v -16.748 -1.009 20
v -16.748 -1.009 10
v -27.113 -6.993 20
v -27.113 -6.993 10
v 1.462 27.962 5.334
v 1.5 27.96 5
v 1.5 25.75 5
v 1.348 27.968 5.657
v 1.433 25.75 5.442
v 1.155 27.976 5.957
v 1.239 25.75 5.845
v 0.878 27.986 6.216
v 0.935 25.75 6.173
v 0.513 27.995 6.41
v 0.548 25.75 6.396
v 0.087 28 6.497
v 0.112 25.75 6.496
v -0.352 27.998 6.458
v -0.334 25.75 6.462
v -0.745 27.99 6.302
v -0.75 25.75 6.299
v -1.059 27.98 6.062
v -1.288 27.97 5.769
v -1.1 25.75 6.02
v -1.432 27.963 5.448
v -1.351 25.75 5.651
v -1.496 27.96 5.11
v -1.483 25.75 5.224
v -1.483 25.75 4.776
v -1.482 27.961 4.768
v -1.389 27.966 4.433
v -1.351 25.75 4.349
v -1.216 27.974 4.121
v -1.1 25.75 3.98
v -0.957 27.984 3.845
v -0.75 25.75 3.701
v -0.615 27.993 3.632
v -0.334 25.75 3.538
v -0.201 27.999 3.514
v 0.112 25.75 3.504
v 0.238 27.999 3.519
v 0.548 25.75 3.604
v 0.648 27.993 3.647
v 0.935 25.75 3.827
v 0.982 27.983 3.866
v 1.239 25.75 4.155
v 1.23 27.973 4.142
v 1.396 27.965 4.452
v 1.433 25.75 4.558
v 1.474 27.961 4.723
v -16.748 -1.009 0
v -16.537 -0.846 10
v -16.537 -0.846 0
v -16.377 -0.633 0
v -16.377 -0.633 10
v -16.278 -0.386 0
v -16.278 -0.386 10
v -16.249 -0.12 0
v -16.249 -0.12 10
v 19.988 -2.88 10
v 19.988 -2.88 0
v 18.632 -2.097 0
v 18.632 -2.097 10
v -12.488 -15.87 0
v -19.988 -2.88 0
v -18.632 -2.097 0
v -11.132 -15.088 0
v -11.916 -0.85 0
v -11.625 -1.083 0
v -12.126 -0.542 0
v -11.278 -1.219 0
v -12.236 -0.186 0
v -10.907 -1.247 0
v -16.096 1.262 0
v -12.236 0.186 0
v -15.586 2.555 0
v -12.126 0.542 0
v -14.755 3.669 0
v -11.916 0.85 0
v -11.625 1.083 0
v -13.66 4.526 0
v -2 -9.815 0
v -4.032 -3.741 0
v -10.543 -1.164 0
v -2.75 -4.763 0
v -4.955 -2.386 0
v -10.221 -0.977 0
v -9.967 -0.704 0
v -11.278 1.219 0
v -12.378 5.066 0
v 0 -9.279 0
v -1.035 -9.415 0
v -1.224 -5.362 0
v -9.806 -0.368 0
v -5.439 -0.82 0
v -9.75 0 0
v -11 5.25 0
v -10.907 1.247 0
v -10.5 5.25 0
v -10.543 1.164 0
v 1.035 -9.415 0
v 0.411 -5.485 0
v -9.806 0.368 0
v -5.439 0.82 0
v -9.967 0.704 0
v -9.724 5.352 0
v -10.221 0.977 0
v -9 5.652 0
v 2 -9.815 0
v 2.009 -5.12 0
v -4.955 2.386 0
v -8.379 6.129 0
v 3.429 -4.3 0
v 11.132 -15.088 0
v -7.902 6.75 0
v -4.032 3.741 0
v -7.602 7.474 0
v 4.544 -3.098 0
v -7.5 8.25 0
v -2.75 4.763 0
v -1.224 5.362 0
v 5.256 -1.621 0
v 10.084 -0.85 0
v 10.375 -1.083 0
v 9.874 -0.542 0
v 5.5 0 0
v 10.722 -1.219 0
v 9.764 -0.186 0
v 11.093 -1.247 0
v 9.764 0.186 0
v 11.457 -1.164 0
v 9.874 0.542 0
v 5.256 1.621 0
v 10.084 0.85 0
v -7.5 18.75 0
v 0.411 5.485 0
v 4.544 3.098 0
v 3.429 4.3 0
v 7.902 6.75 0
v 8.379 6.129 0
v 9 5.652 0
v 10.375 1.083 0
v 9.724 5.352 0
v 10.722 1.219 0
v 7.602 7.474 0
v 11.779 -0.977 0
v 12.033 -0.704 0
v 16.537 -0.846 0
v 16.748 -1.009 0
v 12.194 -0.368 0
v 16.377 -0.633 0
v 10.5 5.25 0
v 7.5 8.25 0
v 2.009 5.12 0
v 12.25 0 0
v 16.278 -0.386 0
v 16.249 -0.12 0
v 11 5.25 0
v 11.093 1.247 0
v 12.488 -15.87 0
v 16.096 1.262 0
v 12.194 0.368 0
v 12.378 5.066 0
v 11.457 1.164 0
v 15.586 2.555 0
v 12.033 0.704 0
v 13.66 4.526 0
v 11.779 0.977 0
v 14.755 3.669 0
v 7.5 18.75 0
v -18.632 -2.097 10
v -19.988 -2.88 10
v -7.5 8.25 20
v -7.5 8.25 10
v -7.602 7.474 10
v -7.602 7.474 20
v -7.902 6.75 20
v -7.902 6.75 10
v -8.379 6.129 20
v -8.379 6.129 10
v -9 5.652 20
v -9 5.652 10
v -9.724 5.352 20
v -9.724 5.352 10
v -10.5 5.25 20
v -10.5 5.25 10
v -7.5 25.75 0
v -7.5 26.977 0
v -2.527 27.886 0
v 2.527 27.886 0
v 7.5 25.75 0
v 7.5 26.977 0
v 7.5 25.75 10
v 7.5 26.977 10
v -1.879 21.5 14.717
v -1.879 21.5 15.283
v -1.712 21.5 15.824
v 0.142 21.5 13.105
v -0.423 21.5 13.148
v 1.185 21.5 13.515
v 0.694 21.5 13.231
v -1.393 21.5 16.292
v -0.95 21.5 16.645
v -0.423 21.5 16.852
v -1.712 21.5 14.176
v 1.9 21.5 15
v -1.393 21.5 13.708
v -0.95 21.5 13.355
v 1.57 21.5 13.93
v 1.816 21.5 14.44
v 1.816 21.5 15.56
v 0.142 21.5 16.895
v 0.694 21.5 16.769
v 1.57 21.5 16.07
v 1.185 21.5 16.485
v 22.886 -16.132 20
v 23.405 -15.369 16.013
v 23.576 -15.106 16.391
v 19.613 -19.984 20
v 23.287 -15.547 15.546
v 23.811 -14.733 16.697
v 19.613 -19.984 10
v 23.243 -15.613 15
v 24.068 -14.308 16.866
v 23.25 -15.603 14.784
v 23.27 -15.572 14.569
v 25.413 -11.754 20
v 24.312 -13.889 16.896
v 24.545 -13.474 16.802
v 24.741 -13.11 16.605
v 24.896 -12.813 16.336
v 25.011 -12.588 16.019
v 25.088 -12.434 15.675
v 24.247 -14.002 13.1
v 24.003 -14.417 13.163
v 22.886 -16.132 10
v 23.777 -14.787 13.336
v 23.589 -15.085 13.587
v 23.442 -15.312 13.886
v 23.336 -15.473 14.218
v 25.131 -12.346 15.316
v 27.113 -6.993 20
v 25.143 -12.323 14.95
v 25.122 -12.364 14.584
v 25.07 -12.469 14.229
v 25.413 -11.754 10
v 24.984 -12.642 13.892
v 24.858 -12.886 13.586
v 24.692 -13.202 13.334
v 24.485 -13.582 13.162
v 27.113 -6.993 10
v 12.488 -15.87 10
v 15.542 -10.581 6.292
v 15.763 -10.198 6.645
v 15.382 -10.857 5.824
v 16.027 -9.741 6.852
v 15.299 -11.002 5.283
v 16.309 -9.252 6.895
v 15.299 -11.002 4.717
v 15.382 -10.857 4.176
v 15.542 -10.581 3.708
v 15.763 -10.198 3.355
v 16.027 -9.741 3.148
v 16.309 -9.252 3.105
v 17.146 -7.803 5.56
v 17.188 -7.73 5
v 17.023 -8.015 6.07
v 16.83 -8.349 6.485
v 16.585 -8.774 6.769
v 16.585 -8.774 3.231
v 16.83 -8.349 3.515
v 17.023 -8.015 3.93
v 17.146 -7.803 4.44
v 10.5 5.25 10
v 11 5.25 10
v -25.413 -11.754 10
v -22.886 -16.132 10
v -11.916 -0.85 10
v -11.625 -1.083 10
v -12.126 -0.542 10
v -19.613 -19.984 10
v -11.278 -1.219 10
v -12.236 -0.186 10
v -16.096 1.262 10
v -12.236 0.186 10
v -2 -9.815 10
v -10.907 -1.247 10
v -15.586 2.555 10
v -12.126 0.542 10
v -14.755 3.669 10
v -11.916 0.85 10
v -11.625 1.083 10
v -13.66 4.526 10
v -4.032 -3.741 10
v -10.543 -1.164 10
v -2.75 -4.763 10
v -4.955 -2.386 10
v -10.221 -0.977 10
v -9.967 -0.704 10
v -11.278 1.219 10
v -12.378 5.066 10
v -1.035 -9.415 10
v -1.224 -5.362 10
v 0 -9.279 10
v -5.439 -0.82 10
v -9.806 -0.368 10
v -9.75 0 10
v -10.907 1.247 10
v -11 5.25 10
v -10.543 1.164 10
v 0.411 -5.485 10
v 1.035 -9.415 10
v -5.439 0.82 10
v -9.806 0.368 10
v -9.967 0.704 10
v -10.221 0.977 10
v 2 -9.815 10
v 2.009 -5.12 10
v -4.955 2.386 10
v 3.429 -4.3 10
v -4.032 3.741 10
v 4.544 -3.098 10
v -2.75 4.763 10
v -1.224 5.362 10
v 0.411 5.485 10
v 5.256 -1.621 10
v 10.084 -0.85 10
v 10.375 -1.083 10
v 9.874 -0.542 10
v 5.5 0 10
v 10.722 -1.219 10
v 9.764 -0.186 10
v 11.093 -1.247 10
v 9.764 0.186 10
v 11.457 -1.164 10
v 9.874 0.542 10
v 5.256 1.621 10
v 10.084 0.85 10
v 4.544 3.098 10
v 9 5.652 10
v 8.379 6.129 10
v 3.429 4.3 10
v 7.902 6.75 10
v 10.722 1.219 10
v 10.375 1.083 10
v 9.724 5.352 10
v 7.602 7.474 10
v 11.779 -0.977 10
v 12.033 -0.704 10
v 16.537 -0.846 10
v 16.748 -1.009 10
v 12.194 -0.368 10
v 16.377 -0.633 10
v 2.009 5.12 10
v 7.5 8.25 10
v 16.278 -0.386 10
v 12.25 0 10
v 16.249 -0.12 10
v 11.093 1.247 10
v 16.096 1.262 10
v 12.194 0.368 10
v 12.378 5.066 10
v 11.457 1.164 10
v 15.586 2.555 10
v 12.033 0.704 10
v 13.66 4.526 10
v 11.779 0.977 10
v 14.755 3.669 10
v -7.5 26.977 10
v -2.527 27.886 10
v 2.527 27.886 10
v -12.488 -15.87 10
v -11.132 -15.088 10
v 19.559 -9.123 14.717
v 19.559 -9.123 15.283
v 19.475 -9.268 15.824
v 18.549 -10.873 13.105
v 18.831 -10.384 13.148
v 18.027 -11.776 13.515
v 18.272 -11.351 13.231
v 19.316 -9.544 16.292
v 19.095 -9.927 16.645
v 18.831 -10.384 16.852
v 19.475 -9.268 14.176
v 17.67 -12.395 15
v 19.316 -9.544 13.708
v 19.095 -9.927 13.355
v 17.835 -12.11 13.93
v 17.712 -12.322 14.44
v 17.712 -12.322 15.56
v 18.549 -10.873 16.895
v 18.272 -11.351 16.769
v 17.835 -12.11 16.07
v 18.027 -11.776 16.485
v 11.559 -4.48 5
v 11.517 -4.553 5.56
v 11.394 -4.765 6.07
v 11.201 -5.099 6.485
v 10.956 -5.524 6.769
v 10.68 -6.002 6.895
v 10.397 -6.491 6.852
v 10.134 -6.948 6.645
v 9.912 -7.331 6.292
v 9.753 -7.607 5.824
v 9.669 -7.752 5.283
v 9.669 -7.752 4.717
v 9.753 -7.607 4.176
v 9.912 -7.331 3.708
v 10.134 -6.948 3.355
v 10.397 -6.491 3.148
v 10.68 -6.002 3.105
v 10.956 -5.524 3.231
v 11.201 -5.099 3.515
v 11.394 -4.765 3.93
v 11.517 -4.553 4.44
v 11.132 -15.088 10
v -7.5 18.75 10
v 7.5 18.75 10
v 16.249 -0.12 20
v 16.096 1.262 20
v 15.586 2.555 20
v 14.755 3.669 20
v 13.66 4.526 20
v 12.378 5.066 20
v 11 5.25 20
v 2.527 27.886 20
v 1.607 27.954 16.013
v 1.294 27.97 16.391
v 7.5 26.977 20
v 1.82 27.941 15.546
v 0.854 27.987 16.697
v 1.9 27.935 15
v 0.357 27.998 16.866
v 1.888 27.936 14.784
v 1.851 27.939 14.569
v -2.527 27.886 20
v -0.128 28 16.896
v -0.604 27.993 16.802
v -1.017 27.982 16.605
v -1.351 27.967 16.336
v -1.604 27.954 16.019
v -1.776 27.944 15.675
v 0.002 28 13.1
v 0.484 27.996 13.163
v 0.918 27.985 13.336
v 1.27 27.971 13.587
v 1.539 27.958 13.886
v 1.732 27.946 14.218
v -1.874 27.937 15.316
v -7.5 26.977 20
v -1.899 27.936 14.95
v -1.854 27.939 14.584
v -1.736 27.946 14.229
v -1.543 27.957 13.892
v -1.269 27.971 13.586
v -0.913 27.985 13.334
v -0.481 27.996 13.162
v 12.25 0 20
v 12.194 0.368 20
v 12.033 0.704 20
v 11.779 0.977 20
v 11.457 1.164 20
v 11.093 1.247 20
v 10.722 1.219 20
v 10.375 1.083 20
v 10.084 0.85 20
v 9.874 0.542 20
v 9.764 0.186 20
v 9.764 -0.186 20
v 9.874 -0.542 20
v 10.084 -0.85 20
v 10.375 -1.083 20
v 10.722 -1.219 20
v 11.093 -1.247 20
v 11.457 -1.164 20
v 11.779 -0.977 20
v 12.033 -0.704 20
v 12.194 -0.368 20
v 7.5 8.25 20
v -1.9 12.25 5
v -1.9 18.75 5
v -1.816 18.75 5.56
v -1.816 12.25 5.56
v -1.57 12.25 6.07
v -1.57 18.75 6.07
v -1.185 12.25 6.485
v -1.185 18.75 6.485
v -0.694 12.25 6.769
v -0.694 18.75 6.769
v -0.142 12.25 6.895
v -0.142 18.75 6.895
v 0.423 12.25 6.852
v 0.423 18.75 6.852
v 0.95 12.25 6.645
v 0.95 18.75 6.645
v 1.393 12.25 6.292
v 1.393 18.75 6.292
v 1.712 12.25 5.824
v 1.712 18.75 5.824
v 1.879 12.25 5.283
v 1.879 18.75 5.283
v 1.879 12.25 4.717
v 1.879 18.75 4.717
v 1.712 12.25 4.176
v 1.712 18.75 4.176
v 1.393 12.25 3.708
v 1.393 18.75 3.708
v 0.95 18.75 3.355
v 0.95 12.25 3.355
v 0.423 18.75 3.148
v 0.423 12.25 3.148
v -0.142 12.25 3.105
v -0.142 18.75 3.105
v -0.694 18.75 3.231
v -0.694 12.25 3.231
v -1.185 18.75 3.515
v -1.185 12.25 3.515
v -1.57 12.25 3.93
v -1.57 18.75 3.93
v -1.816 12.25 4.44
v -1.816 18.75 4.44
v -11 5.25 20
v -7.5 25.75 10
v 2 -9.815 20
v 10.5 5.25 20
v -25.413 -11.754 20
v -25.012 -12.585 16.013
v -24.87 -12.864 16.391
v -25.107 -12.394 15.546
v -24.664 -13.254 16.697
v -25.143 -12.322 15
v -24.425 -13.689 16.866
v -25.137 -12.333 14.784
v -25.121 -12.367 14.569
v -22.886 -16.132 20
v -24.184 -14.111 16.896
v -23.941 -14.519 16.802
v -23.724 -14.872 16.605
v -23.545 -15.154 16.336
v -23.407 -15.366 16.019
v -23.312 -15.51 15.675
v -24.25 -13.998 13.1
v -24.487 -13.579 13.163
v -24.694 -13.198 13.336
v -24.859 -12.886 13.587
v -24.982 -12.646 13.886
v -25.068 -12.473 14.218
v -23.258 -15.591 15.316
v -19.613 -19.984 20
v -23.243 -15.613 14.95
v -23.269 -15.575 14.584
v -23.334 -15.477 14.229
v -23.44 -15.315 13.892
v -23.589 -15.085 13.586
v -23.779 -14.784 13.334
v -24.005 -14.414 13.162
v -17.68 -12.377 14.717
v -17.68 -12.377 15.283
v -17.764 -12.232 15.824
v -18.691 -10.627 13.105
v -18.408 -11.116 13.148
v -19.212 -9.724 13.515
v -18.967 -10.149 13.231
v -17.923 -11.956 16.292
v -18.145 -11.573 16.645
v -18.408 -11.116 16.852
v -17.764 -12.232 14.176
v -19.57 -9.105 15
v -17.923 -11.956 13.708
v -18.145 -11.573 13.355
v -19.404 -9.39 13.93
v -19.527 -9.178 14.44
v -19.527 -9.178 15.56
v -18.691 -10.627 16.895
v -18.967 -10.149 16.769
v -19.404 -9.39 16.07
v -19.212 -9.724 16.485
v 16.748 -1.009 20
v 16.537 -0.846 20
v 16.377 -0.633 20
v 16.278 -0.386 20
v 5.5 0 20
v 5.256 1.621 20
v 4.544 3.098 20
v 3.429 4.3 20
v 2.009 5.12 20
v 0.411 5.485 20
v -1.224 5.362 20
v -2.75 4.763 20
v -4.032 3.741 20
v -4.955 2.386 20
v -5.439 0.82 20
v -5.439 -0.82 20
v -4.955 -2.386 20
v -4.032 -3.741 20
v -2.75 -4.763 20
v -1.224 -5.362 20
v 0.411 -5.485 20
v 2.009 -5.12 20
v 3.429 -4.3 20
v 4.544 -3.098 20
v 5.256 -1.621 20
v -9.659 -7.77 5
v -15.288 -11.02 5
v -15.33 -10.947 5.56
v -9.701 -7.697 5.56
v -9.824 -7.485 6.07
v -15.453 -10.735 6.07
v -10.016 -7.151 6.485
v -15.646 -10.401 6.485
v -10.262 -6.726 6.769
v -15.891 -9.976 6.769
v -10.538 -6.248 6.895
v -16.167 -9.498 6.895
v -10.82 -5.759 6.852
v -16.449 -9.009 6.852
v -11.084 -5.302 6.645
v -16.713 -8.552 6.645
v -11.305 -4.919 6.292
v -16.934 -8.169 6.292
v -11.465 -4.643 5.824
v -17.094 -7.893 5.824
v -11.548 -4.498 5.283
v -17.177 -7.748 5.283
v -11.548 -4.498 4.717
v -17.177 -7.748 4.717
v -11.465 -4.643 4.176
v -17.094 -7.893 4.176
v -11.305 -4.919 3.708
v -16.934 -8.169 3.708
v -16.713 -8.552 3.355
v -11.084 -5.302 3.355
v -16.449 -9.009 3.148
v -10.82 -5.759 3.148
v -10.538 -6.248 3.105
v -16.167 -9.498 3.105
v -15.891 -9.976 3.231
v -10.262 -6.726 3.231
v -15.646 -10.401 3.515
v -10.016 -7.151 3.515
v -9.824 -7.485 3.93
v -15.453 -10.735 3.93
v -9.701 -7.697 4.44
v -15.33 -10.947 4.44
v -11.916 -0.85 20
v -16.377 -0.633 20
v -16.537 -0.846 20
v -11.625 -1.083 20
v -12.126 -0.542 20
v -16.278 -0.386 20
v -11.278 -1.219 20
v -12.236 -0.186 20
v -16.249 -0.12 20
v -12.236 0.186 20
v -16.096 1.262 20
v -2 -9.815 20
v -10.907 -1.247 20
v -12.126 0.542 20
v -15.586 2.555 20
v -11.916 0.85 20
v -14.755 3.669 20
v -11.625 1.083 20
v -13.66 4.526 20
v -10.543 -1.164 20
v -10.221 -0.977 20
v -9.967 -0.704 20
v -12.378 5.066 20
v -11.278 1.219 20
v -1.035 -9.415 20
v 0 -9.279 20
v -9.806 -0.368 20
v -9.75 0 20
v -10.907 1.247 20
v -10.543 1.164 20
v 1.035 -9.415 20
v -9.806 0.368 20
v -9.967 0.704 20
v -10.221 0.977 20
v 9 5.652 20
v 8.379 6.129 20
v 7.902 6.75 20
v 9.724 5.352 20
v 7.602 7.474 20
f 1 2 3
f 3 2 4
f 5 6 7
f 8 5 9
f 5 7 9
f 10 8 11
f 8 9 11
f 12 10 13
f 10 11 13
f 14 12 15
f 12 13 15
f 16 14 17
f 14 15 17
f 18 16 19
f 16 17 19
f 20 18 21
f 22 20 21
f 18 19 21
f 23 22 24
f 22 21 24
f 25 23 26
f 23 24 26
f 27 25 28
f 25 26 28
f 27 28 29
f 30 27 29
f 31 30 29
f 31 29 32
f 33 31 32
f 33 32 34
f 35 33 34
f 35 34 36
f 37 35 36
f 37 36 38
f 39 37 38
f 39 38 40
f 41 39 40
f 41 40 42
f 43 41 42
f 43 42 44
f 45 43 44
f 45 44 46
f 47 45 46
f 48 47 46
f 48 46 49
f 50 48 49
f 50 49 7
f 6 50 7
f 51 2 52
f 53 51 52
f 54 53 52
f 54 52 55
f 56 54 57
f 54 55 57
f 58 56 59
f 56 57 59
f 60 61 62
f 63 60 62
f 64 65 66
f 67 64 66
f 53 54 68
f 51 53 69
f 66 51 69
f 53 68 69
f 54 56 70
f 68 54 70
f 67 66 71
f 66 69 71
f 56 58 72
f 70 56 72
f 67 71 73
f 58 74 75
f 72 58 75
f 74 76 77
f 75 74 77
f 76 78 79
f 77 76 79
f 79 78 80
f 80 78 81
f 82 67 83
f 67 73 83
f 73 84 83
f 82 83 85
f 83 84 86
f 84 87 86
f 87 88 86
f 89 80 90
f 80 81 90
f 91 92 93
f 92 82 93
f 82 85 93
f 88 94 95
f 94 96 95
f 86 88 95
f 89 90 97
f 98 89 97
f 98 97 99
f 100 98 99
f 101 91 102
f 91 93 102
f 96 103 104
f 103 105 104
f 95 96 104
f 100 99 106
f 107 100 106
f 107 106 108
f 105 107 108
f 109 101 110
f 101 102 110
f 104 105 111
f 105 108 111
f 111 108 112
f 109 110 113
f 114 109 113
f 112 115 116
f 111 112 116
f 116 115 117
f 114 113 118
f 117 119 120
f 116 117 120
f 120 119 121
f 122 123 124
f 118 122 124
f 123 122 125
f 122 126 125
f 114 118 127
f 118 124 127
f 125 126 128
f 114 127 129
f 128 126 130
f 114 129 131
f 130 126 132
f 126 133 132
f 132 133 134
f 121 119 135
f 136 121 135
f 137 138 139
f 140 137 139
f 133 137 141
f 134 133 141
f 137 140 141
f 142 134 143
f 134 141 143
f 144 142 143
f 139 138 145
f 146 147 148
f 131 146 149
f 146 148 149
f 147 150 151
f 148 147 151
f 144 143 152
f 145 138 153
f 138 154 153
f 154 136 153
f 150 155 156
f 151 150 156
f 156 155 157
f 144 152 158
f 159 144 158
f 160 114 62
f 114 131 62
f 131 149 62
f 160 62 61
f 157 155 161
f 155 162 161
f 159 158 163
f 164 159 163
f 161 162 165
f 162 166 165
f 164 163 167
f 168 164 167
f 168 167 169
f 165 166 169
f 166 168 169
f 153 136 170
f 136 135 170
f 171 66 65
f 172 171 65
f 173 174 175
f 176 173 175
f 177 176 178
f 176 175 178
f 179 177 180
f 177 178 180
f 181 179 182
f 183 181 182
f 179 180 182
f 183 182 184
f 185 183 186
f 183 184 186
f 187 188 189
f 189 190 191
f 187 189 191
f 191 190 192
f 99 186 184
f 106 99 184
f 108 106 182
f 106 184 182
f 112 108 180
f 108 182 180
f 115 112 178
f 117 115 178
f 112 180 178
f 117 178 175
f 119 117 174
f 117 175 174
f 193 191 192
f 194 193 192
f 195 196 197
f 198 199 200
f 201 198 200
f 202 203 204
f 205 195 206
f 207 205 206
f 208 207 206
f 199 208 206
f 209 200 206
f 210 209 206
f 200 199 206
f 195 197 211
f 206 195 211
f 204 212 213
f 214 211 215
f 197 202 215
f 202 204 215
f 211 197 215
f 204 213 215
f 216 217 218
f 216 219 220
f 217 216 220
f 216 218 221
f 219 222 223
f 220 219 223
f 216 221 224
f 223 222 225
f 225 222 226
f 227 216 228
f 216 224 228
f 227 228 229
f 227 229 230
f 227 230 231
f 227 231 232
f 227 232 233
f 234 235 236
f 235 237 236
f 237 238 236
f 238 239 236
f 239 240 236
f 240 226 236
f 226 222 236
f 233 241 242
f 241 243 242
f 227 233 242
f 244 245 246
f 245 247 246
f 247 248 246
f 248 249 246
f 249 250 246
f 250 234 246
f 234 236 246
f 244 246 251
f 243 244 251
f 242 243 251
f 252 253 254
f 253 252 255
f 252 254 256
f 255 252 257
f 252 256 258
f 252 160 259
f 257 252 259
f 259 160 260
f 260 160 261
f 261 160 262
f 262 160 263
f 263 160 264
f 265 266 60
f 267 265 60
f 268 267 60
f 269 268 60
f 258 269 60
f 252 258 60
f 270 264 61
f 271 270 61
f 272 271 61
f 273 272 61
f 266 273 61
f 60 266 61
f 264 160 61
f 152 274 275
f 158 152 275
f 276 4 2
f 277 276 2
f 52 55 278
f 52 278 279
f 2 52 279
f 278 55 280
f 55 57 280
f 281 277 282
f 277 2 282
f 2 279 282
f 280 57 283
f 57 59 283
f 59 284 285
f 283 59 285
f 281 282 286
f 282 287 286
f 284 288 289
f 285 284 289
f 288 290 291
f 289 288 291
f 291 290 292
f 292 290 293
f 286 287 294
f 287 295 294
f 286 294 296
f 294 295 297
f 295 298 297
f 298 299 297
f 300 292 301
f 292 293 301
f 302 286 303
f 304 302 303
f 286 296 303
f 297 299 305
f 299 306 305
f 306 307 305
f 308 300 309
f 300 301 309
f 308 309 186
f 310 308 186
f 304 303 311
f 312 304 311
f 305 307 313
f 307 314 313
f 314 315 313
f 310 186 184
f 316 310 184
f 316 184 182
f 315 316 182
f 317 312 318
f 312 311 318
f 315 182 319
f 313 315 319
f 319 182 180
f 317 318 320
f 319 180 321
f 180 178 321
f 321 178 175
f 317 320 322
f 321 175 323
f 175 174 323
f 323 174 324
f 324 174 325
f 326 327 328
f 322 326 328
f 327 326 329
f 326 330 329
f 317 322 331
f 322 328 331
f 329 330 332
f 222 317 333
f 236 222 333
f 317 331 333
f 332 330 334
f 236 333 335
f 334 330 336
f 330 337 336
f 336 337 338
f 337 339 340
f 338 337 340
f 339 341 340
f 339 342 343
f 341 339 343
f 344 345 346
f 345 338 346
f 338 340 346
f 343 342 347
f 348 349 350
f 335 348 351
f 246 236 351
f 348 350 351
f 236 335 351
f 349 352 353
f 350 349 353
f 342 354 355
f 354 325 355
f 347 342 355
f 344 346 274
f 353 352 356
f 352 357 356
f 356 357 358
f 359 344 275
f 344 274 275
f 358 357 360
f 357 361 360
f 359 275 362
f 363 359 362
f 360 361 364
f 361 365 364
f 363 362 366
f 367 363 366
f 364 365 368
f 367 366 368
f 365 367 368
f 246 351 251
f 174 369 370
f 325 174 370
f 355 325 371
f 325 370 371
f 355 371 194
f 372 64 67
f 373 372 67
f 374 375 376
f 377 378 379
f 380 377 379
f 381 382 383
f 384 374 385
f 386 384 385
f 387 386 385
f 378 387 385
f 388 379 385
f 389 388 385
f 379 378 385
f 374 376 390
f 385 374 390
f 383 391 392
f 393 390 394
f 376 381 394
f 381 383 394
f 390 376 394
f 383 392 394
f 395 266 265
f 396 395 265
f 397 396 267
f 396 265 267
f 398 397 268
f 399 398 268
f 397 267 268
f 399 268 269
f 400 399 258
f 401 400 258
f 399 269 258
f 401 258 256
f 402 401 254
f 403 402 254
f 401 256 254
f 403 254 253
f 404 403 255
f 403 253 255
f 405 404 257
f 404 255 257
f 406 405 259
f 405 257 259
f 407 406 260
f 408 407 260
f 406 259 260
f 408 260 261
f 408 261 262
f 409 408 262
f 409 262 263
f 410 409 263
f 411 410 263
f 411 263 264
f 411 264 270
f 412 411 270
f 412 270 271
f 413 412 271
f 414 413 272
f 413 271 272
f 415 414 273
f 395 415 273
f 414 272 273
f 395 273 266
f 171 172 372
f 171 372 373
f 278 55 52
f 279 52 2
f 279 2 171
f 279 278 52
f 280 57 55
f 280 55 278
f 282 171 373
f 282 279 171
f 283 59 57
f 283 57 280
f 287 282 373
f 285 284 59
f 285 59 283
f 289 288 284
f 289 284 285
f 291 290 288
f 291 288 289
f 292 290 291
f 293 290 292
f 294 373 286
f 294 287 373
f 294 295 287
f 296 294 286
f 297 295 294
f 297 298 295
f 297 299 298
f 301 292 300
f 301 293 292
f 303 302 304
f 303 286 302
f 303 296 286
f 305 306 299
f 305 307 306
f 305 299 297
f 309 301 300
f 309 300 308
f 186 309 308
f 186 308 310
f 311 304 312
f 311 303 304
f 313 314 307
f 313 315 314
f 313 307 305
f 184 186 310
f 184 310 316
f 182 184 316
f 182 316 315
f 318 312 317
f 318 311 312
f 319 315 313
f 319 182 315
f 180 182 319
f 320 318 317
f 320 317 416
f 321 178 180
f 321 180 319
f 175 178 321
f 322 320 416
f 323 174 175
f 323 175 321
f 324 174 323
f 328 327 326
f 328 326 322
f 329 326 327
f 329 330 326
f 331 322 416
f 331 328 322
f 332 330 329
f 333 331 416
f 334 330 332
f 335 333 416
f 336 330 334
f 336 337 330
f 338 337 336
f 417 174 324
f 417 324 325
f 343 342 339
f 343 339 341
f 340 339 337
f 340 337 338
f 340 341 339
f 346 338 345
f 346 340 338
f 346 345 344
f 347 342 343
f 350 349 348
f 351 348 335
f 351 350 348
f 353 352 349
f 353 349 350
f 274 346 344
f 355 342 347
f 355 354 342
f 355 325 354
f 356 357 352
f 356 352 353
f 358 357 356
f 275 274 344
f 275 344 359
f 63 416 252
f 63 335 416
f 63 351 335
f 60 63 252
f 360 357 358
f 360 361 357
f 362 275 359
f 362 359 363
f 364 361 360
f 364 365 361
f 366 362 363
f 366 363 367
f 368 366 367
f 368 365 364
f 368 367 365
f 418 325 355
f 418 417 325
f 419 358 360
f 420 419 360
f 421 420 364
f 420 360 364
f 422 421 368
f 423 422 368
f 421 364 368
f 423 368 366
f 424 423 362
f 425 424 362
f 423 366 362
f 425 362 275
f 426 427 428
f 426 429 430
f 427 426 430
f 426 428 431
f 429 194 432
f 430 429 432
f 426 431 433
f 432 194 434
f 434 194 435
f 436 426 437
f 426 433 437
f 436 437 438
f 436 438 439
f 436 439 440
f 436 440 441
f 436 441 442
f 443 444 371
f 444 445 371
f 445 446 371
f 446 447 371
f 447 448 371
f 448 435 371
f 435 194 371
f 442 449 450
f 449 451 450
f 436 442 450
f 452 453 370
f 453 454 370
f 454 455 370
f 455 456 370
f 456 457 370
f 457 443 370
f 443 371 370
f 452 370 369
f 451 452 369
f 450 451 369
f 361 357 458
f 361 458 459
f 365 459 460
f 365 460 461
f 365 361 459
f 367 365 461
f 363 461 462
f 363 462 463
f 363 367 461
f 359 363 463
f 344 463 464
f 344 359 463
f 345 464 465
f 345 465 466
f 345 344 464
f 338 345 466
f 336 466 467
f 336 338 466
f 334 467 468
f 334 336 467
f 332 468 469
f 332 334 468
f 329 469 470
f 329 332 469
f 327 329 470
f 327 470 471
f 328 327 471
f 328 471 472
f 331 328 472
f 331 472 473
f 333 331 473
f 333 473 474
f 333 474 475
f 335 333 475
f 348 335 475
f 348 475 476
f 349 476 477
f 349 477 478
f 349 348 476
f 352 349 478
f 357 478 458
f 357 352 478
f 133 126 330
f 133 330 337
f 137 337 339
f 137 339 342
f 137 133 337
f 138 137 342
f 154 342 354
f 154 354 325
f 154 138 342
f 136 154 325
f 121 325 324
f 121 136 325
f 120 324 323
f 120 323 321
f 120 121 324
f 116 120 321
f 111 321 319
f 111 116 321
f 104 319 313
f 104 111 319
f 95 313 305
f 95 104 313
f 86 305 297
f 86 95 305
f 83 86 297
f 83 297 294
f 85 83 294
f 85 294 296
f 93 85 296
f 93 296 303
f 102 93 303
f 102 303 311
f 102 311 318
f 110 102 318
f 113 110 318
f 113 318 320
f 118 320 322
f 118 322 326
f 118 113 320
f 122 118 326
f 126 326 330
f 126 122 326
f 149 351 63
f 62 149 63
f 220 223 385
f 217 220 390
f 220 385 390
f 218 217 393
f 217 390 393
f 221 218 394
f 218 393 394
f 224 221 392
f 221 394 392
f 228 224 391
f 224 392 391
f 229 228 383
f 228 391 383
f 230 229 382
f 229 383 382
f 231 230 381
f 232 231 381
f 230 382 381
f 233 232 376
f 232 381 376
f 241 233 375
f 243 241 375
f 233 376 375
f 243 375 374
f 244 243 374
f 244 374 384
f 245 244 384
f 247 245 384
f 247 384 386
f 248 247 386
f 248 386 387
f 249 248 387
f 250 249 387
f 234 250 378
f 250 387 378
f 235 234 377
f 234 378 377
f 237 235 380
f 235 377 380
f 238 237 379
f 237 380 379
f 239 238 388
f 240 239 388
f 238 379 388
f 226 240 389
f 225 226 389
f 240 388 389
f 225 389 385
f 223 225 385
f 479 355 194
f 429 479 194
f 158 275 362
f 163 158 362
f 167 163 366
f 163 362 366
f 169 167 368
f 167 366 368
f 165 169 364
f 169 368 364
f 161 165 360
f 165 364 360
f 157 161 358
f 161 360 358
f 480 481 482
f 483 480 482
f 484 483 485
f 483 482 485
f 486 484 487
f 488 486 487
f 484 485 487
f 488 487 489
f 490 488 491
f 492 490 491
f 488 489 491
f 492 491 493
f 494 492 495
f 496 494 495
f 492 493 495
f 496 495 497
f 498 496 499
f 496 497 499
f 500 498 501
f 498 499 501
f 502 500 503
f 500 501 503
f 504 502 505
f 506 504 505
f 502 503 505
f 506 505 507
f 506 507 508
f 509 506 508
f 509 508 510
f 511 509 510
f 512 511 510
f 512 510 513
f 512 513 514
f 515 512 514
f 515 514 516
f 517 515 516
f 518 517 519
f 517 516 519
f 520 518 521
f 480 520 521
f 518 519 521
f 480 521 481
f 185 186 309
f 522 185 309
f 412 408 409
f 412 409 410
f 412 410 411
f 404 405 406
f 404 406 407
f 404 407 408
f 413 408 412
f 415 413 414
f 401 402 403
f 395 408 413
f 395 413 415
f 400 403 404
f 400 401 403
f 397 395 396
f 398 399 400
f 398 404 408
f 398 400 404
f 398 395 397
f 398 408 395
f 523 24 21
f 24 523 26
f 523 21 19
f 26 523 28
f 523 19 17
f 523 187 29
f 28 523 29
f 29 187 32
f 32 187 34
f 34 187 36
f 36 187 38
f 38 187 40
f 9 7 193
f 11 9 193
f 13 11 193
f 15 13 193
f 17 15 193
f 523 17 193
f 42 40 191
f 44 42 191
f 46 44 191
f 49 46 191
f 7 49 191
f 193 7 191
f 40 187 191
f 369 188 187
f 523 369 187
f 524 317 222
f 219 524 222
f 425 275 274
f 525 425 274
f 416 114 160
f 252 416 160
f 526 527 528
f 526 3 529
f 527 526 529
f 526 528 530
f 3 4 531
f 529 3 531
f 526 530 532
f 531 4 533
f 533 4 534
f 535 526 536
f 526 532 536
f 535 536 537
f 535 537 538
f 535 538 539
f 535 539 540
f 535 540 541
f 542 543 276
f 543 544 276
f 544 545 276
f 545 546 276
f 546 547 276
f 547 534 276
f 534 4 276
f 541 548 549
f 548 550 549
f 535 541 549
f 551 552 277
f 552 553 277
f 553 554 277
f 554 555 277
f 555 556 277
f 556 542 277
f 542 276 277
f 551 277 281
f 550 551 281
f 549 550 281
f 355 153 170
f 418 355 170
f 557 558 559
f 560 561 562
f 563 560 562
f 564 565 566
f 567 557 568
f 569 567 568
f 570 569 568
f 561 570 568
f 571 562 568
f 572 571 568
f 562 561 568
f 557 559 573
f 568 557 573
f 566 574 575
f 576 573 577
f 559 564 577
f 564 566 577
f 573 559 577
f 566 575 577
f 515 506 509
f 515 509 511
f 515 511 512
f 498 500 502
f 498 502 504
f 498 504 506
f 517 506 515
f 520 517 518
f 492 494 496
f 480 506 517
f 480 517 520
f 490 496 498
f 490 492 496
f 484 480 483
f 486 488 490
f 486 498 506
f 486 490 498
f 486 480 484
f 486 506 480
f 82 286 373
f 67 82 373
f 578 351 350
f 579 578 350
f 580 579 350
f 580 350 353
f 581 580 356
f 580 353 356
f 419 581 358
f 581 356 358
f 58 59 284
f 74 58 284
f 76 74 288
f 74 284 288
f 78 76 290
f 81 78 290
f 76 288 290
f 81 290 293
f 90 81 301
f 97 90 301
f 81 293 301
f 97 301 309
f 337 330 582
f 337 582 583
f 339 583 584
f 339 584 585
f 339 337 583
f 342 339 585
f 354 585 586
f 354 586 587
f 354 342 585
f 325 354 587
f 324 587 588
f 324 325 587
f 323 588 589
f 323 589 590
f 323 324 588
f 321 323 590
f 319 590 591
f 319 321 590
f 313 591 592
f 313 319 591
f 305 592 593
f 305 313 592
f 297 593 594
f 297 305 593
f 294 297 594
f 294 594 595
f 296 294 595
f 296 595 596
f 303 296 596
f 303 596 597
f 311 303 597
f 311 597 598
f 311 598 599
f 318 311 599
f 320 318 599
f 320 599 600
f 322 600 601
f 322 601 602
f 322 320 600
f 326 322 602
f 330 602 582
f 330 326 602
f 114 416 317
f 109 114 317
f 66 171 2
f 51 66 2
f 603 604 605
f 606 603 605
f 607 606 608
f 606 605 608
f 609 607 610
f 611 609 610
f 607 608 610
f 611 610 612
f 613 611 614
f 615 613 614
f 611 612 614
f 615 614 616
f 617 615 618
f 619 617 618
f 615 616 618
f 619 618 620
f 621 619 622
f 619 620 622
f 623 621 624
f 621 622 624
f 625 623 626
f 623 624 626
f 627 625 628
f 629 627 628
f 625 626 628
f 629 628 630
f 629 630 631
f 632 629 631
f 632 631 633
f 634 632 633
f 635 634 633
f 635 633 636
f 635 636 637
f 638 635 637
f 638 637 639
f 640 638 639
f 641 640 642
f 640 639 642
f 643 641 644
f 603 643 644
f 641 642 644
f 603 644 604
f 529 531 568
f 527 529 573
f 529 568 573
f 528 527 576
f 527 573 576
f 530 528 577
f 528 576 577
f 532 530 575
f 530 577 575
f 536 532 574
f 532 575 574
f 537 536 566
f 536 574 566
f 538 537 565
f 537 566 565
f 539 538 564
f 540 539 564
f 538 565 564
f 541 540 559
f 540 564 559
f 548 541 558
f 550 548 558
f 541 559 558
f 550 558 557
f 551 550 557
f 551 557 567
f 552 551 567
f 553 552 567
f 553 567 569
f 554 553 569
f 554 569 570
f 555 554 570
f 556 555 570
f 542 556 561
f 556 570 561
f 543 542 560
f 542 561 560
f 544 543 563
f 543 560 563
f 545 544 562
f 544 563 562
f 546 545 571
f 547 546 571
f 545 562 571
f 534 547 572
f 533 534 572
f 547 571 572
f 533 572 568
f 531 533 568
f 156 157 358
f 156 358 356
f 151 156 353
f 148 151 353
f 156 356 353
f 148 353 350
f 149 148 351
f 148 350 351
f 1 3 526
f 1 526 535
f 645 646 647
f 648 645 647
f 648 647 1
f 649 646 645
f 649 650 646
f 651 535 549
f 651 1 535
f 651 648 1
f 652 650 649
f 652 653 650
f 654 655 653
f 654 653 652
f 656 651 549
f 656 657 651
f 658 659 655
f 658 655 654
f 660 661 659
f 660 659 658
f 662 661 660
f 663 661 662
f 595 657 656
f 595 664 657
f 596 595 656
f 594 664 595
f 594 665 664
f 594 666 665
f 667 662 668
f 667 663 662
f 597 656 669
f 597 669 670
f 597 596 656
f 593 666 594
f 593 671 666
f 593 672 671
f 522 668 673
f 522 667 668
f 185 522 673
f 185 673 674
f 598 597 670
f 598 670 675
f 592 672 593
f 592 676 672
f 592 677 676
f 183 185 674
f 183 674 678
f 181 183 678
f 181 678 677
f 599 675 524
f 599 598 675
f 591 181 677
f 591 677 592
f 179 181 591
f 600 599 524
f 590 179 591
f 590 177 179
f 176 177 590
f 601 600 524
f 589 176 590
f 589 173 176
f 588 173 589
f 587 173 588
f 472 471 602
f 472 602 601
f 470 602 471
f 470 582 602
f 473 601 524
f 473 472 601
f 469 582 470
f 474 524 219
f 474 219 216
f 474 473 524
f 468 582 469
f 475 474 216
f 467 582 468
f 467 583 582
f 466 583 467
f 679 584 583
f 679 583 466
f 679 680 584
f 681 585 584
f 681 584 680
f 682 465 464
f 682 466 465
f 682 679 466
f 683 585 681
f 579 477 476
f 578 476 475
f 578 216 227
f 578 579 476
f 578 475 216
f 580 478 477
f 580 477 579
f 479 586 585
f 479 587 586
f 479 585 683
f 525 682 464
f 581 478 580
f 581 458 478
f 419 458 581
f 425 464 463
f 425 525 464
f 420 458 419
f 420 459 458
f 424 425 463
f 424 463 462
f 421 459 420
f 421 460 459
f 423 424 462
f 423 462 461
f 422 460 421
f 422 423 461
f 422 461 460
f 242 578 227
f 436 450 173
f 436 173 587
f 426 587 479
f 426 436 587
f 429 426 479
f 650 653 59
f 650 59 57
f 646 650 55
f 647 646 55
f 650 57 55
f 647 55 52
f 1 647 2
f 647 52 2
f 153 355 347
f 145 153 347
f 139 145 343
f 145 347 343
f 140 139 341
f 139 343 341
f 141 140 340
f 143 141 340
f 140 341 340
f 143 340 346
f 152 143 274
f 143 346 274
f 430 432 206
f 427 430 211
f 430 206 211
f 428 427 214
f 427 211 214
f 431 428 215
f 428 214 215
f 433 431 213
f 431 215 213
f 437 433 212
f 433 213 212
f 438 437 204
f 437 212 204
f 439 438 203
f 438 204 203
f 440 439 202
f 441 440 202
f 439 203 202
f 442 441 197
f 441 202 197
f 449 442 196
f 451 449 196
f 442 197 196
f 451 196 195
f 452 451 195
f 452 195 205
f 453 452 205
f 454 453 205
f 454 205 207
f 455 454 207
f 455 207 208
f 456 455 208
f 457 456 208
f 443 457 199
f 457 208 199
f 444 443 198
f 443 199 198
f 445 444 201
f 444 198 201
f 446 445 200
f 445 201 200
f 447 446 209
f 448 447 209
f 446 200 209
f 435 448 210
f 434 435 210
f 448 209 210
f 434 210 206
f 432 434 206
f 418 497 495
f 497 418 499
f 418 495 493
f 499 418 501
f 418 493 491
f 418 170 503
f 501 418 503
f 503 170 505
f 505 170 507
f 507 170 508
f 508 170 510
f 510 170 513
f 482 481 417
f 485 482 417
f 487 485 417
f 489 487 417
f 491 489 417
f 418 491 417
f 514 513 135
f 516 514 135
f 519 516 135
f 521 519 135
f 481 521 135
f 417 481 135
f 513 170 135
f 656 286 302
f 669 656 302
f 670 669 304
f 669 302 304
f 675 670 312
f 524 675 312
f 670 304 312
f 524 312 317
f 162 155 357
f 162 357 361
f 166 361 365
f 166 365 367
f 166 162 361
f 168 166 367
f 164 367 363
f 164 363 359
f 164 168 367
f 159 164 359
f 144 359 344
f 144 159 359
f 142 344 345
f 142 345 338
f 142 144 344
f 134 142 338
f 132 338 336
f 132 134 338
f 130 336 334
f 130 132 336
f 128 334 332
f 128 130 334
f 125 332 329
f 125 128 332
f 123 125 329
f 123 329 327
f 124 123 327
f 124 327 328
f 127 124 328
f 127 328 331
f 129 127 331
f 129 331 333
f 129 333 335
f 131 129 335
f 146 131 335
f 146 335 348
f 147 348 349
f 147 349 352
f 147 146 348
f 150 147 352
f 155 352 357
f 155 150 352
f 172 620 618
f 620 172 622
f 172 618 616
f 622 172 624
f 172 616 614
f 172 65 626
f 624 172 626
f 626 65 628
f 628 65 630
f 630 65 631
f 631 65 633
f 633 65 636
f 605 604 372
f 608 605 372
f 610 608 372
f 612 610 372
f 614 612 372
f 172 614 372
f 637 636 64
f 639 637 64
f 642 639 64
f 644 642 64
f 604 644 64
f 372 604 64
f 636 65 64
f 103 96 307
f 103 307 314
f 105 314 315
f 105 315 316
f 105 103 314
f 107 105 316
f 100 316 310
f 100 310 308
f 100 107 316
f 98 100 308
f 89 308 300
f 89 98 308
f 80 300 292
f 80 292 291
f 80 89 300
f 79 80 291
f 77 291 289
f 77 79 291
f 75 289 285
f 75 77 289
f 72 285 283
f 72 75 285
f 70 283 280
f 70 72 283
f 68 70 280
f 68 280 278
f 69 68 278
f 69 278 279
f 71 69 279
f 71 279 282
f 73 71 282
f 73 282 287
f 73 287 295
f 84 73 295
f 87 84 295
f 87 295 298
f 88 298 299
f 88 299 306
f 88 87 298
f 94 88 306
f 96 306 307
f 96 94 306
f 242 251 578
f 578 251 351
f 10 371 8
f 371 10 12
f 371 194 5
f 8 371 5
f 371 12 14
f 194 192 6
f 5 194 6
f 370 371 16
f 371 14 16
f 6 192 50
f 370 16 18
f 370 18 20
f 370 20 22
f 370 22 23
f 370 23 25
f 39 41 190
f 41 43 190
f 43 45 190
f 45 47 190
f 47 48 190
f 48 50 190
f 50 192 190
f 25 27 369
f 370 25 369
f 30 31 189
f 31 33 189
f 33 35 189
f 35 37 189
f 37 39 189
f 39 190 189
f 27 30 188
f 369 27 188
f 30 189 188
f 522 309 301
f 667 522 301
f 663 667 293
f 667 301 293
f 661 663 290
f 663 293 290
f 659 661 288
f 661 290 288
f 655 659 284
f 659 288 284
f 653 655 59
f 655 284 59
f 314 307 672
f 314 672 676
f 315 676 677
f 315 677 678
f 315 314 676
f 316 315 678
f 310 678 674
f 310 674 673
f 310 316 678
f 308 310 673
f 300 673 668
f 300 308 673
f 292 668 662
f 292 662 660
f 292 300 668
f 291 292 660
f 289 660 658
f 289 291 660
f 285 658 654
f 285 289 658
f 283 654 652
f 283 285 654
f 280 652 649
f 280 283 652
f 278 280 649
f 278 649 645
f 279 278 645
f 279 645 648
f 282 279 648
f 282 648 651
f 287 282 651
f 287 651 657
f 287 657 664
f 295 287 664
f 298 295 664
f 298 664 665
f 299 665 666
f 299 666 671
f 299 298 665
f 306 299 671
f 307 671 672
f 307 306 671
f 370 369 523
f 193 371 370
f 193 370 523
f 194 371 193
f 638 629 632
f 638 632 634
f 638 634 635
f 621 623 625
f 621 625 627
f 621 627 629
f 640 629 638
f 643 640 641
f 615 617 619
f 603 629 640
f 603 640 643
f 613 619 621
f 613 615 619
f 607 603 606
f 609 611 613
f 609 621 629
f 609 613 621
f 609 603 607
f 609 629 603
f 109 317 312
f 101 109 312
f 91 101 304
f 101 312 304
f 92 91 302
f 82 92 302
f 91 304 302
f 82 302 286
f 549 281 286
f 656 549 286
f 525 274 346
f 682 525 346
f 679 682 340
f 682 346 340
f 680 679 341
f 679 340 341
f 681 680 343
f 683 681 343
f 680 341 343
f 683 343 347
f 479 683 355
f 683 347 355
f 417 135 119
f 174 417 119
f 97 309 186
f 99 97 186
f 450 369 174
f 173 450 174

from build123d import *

# Parameters (mm, degrees)
F1_DEPTH  = 10
F0_R      = 1.25
F0_R_2    = 5.5
F2_R      = 1.9
F3_DEPTH  = 6.5
F4_COUNT  = 3
F6_R      = 1.5
F7_DEPTH  = 2.25
F9_DEPTH  = 10
F10_R     = 1.25
F10_R_2   = 5.5
F11_DEPTH = 10
F14_R     = 1.9
F15_DEPTH = 6.5
F16_COUNT = 3


with BuildPart() as f1:
    # F0 (on Top) → F1 (new body)
    with BuildSketch(Plane.XY):
        with BuildLine():
            Line((7.5, 25.75), (7.5, 26.9768419204))
            ThreePointArc((7.5, 26.9768419204), (0, 28), (-7.5, 26.9768419204))
            Line((-7.5, 26.9768419204), (-7.5, 25.75))
            Line((-7.5, 25.75), (7.5, 25.75))
        make_face()
    extrude(amount=F1_DEPTH)

    # F6 (on face) → F7 (cut, through all)
    with BuildSketch(Plane.XZ.offset(-25.75)):
        with Locations((0, 5)):
            Circle(F6_R)
    extrude(amount=-F7_DEPTH, mode=Mode.SUBTRACT)


with BuildPart() as f1b:
    # F0 (on Top) → F1, piece 2 (new body)
    with BuildSketch(Plane.XY):
        with BuildLine():
            Line((-7.5, 18.75), (-7.5, 17.1846588561))
            ThreePointArc((-7.5, 17.1846588561), (-16.237976321, 9.375), (-18.6323511247, -2.0971388997))
            Line((-18.6323511247, -2.0971388997), (-19.987976321, -2.8798094716))
            Line((-19.987976321, -2.8798094716), (-12.487976321, -15.8701905284))
            Line((-12.487976321, -15.8701905284), (-11.1323511247, -15.0875199564))
            ThreePointArc((-11.1323511247, -15.0875199564), (0, -18.75), (11.1323511247, -15.0875199564))
            Line((11.1323511247, -15.0875199564), (12.487976321, -15.8701905284))
            Line((12.487976321, -15.8701905284), (19.987976321, -2.8798094716))
            Line((19.987976321, -2.8798094716), (18.6323511247, -2.0971388997))
            ThreePointArc((18.6323511247, -2.0971388997), (16.237976321, 9.375), (7.5, 17.1846588561))
            Line((7.5, 17.1846588561), (7.5, 18.75))
            Line((7.5, 18.75), (-7.5, 18.75))
        make_face()
        with Locations((-11, 0)):
            Circle(F0_R, mode=Mode.SUBTRACT)
        Circle(F0_R_2, mode=Mode.SUBTRACT)
        with Locations((11, 0)):
            Circle(F0_R, mode=Mode.SUBTRACT)
    extrude(amount=F1_DEPTH)


with BuildPart() as f3:
    # F2 (on face) → F3 (new body)
    with BuildSketch(Plane(origin=(-16.237976321, -9.375, 0), x_dir=(0.5, -0.8660254038, 0), z_dir=(-0.8660254038, -0.5, 0))):
        with Locations((0, 5)):
            Circle(F2_R)
    extrude(amount=-F3_DEPTH)


with BuildPart() as f4_1:
    # F4: instance of F3
    add(f3.part.rotate(Axis((0, 0, 0), (0, 0, -1)), 1 * 360 / F4_COUNT))


with BuildPart() as f4_2:
    # F4: instance of F3
    add(f3.part.rotate(Axis((0, 0, 0), (0, 0, -1)), 2 * 360 / F4_COUNT))


with BuildPart() as f1b_1:
    add(f1b.part)

    # F5: cut F3, F4_1, F4_2
    add(f3.part, mode=Mode.SUBTRACT)
    add(f4_1.part, mode=Mode.SUBTRACT)
    add(f4_2.part, mode=Mode.SUBTRACT)

    # F8 (on face) → F9 (cut, through all)
    with BuildSketch(Plane.XY.offset(10)):
        with BuildLine():
            ThreePointArc((-16.2486181818, -0.1204457634), (-14.7546531303, 3.6694795096), (-11, 5.25))
            Line((-11, 5.25), (-10.5, 5.25))
            ThreePointArc((-10.5, 5.25), (-8.3786796564, 6.1286796564), (-7.5, 8.25))
            Line((-7.5, 8.25), (-7.5, 17.1846588561))
            ThreePointArc((-7.5, 17.1846588561), (-16.237976321, 9.375), (-18.6323511247, -2.0971388997))
            Line((-18.6323511247, -2.0971388997), (-16.7483549783, -1.0094132174))
            ThreePointArc((-16.7483549783, -1.0094132174), (-16.3766506716, -0.6334200592), (-16.2486181818, -0.1204457634))
        make_face()
        with BuildLine():
            ThreePointArc((11, 5.25), (14.7546531303, 3.6694795096), (16.2486181818, -0.1204457634))
            ThreePointArc((16.2486181818, -0.1204457634), (16.3766506716, -0.6334200592), (16.7483549783, -1.0094132174))
            Line((16.7483549783, -1.0094132174), (18.6323511247, -2.0971388997))
            ThreePointArc((18.6323511247, -2.0971388997), (16.237976321, 9.375), (7.5, 17.1846588561))
            Line((7.5, 17.1846588561), (7.5, 8.25))
            ThreePointArc((7.5, 8.25), (8.3786796564, 6.1286796564), (10.5, 5.25))
            Line((10.5, 5.25), (11, 5.25))
        make_face()
        with BuildLine():
            Line((-2, -9.8149545762), (-11.1323511247, -15.0875199564))
            ThreePointArc((-11.1323511247, -15.0875199564), (0, -18.75), (11.1323511247, -15.0875199564))
            Line((11.1323511247, -15.0875199564), (2, -9.8149545762))
            ThreePointArc((2, -9.8149545762), (0, -9.2790561914), (-2, -9.8149545762))
        make_face()
    extrude(amount=-F9_DEPTH, mode=Mode.SUBTRACT)


with BuildPart() as f11:
    # F10 (on face) → F11 (new body)
    with BuildSketch(Plane.XY.offset(10)):
        with BuildLine():
            Line((-16.7483549783, -1.0094132174), (-27.112630417, -6.9932304318))
            ThreePointArc((-27.112630417, -6.9932304318), (-24.248711306, -14), (-19.612630417, -19.9836114886))
            Line((-19.612630417, -19.9836114886), (-2, -9.8149545762))
            ThreePointArc((-2, -9.8149545762), (0, -9.2790561914), (2, -9.8149545762))
            Line((2, -9.8149545762), (19.612630417, -19.9836114886))
            ThreePointArc((19.612630417, -19.9836114886), (24.248711306, -14), (27.112630417, -6.9932304318))
            Line((27.112630417, -6.9932304318), (16.7483549783, -1.0094132174))
            ThreePointArc((16.7483549783, -1.0094132174), (16.3766506716, -0.6334200592), (16.2486181818, -0.1204457634))
            ThreePointArc((16.2486181818, -0.1204457634), (14.7546531303, 3.6694795096), (11, 5.25))
            Line((11, 5.25), (10.5, 5.25))
            ThreePointArc((10.5, 5.25), (8.3786796564, 6.1286796564), (7.5, 8.25))
            Line((7.5, 8.25), (7.5, 26.9768419204))
            ThreePointArc((7.5, 26.9768419204), (0, 28), (-7.5, 26.9768419204))
            Line((-7.5, 26.9768419204), (-7.5, 8.25))
            ThreePointArc((-7.5, 8.25), (-8.3786796564, 6.1286796564), (-10.5, 5.25))
            Line((-10.5, 5.25), (-11, 5.25))
            ThreePointArc((-11, 5.25), (-14.7546531303, 3.6694795096), (-16.2486181818, -0.1204457634))
            ThreePointArc((-16.2486181818, -0.1204457634), (-16.3766506716, -0.6334200592), (-16.7483549783, -1.0094132174))
        make_face()
        with Locations((-11, 0)):
            Circle(F10_R, mode=Mode.SUBTRACT)
        Circle(F10_R_2, mode=Mode.SUBTRACT)
        with Locations((11, 0)):
            Circle(F10_R, mode=Mode.SUBTRACT)
    extrude(amount=F11_DEPTH)

    # F16: F15 ×3 about axis
    f16_axis = Axis((0, 0, 10), (0, 0, -1))


with BuildPart() as f15:
    # F14 (on plane+point) → F15 (new body, symmetric)
    with BuildSketch(Plane.XZ.offset(-28)):
        with Locations((0, 15)):
            Circle(F14_R)
    extrude(amount=F15_DEPTH, both=True)


with BuildPart() as f11_1:
    add(f11.part)
    for i in range(1, F16_COUNT):
        add(f15.part.rotate(f16_axis, i * 360 / F16_COUNT), mode=Mode.SUBTRACT)

    # F16#seed: cut F15
    add(f15.part, mode=Mode.SUBTRACT)


solid = Compound([f1.part, f1b_1.part, f11_1.part])
